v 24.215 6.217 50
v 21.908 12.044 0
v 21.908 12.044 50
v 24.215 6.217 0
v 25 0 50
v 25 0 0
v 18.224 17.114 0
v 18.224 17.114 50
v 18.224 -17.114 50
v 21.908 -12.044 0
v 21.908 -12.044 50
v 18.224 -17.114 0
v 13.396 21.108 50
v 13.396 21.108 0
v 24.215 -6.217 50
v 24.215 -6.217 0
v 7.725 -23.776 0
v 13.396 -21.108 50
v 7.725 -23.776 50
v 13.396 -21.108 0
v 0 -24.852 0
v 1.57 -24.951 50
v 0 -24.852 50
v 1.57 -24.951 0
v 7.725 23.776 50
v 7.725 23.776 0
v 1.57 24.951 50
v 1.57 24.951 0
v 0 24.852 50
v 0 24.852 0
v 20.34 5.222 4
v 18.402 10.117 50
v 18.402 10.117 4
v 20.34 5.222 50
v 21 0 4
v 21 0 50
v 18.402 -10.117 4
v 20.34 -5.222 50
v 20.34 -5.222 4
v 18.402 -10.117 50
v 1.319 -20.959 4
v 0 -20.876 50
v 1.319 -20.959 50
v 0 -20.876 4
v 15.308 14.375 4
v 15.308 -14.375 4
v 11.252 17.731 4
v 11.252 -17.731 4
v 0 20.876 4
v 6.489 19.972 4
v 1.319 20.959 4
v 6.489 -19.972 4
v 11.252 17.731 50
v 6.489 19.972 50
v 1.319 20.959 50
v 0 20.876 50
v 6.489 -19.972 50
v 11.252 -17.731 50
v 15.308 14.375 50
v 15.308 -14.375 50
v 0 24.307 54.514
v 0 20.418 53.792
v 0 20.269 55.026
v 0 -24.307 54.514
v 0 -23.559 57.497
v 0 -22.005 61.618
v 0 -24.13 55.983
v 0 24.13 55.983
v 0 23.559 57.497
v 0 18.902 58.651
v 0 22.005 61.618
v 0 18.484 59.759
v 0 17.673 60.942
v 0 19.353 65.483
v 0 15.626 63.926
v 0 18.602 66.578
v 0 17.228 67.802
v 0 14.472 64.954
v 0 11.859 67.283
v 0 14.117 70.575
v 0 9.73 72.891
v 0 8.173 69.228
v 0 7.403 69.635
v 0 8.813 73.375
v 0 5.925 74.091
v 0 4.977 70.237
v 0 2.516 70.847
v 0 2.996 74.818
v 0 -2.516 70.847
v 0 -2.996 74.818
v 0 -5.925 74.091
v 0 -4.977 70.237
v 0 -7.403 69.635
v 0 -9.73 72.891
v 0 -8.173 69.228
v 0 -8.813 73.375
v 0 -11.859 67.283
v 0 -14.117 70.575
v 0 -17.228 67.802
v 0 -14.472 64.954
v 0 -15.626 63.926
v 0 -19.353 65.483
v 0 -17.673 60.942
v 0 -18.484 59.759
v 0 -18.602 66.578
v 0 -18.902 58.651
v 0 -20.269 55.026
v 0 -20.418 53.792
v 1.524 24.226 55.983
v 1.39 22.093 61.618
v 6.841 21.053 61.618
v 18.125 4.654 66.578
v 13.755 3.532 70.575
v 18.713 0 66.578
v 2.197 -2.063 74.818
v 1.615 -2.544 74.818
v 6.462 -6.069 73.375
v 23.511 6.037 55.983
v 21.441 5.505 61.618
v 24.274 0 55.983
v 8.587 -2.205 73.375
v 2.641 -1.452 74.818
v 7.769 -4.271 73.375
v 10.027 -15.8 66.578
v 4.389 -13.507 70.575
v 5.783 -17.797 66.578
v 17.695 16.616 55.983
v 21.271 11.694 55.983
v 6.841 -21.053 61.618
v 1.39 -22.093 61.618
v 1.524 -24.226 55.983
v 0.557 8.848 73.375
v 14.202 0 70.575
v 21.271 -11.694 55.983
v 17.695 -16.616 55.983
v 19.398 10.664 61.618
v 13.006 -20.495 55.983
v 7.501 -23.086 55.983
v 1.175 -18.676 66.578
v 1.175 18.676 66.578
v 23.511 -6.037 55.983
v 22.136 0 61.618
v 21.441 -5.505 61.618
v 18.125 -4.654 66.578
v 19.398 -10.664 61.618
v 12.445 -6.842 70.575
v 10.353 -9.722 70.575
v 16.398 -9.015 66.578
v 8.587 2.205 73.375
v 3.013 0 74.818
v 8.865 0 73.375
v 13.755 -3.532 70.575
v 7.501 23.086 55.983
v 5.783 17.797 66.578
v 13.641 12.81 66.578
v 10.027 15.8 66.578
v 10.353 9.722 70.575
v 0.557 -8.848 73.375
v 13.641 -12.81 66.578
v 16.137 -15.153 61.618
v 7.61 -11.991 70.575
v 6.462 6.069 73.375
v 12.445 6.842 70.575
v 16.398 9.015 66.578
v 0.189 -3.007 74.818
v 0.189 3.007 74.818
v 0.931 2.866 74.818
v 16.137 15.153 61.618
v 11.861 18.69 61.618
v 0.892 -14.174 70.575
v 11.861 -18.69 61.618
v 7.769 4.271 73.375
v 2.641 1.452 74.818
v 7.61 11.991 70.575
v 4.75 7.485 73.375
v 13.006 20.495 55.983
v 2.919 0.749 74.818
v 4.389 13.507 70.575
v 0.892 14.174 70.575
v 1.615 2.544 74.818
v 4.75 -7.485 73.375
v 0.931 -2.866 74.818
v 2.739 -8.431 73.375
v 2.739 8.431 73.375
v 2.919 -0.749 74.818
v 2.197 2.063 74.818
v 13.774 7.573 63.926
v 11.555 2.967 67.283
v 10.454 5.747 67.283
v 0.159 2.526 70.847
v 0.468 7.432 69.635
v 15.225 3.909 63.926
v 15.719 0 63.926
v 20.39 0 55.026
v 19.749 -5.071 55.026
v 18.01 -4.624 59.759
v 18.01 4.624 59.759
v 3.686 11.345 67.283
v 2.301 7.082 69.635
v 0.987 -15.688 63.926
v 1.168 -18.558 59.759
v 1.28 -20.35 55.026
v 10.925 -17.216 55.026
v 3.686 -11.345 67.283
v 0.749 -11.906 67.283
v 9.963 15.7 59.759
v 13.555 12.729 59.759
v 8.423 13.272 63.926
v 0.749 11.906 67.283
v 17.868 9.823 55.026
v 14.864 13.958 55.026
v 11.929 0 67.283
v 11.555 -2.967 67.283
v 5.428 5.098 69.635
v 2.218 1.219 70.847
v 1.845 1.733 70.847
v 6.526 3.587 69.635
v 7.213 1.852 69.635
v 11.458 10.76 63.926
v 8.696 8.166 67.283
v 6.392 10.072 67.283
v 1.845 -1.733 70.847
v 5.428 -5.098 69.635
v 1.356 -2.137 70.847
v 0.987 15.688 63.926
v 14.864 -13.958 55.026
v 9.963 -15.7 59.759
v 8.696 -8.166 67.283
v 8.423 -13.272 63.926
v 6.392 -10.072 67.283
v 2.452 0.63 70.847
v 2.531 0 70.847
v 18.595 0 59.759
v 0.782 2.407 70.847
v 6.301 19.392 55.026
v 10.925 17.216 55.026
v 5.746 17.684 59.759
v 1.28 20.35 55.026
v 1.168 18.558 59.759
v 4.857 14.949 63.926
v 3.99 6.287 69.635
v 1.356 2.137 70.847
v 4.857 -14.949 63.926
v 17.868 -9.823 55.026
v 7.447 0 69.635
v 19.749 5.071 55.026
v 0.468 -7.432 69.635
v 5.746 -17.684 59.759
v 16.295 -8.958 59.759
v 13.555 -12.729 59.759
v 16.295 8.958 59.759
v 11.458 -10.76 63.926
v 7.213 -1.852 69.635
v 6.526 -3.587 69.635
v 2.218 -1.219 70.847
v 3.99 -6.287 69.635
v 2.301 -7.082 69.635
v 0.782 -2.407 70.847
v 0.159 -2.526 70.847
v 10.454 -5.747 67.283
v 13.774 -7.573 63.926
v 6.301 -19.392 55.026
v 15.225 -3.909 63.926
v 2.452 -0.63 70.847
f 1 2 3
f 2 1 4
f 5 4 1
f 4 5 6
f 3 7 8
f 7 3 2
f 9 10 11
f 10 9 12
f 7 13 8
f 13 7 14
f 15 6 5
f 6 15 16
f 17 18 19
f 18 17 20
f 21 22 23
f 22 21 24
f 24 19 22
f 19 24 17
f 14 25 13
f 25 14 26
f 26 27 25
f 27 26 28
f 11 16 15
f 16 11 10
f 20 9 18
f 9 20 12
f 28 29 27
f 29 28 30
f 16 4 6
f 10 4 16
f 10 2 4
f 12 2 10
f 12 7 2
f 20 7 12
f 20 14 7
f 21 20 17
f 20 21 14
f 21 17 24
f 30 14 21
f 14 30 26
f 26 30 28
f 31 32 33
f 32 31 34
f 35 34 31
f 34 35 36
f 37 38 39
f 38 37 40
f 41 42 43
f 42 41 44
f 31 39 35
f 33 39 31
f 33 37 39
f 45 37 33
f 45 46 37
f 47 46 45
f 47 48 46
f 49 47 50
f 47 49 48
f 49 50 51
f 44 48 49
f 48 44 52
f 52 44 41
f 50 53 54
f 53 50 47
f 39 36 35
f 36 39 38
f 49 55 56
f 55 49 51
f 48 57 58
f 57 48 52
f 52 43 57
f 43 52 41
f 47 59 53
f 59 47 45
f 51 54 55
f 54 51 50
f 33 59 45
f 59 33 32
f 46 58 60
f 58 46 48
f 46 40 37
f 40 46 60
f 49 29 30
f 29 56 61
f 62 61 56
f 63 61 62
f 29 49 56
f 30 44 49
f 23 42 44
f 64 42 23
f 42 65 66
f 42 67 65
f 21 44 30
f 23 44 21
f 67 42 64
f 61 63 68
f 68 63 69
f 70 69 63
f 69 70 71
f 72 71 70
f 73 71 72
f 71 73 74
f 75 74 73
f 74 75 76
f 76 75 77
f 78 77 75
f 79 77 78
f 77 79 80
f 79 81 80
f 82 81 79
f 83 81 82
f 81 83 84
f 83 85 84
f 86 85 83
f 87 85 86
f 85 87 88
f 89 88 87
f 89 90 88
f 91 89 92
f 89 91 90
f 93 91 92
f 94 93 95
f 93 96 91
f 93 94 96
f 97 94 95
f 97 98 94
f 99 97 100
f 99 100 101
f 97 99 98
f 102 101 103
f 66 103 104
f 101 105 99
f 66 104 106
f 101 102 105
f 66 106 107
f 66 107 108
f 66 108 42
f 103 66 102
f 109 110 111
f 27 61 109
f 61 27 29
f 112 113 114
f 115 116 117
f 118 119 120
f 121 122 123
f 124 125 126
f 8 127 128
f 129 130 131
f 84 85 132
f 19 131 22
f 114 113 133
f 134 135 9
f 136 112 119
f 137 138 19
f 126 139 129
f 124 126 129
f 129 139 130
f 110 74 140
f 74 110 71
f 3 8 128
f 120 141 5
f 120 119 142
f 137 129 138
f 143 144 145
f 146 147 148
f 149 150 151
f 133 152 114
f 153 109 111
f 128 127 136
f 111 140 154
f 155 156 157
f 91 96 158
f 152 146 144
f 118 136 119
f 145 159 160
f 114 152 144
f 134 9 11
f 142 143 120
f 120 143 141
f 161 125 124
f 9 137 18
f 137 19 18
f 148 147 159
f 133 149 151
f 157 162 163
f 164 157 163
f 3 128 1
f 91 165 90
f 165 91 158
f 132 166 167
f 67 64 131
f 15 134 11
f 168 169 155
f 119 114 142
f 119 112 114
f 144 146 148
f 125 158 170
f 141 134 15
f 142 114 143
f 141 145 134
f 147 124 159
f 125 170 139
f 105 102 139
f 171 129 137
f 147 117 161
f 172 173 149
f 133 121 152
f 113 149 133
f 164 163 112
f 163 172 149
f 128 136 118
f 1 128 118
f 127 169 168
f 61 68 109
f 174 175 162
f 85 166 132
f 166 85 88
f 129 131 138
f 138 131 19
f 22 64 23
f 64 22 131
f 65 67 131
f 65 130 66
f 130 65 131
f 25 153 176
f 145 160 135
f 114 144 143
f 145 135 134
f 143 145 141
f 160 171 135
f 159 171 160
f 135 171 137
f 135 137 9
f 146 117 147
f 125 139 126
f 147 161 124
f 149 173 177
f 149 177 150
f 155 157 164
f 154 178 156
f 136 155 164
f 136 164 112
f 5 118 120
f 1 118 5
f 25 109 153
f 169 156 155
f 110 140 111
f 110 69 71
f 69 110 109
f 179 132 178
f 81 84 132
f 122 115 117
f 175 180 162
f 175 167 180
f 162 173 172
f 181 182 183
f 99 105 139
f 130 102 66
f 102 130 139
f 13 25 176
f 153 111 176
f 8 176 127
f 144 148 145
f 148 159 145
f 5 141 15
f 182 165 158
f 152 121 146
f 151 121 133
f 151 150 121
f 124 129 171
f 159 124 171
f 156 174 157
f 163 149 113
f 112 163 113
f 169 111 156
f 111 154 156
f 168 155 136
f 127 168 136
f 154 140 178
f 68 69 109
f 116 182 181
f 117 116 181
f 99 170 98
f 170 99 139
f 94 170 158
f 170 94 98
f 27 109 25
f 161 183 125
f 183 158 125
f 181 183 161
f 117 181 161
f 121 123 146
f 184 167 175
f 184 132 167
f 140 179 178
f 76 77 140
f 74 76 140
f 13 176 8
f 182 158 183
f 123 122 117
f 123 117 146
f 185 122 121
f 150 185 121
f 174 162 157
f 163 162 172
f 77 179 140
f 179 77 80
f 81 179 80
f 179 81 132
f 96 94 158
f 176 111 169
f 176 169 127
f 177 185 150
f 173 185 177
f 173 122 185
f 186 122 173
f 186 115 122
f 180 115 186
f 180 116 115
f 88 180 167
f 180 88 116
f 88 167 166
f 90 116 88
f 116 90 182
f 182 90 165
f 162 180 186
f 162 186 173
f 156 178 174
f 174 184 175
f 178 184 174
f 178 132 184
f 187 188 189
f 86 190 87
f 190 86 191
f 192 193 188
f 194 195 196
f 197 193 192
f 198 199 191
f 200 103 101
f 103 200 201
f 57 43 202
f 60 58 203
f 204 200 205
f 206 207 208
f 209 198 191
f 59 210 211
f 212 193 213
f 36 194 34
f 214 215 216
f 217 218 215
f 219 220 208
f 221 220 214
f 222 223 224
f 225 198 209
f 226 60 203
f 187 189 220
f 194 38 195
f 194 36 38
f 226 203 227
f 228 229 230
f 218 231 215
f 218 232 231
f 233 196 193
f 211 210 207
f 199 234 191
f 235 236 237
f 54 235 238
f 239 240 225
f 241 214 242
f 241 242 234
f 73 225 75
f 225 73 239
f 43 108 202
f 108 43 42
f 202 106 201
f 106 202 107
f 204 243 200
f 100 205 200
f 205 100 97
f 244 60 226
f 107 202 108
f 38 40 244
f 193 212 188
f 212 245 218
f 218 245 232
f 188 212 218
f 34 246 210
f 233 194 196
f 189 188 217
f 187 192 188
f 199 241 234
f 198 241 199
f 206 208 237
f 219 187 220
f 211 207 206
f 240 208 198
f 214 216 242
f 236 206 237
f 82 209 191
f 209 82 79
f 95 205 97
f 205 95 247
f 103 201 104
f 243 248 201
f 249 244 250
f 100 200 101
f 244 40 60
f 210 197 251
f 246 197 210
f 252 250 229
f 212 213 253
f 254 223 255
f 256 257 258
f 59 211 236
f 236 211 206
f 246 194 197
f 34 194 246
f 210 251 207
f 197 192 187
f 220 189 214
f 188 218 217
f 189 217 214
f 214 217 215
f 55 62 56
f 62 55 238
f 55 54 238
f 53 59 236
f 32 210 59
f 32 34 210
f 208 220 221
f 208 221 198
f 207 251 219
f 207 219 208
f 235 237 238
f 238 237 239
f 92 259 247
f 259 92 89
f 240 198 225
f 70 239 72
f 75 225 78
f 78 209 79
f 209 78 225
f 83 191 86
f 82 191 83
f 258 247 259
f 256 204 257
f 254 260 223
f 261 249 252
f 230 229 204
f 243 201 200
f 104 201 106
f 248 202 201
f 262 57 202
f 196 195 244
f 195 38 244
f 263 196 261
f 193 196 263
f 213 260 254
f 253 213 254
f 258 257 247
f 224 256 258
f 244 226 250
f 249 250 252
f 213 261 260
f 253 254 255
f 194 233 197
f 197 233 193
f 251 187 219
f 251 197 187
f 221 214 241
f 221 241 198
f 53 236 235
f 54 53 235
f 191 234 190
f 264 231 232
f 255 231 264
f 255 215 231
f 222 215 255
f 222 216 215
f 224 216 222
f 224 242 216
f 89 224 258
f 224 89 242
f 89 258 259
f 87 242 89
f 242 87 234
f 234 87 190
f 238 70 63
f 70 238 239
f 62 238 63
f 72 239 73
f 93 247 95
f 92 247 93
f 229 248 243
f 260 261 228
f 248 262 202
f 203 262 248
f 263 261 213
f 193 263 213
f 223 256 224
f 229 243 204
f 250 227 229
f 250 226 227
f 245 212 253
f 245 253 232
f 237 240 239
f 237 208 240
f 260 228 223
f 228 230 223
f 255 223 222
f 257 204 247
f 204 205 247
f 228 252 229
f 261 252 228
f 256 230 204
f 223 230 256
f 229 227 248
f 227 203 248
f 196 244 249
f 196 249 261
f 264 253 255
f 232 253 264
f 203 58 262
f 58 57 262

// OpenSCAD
$fn=25;

*difference() { 
    linear_extrude(50) minkowski() { 
        square(48, center=true); 
        circle(1);
    }
    
    translate([0,0,2]) linear_extrude(50) minkowski() { 
        square(40, center=true); 
        circle(1);
    }
    translate([0,-25,-1]) cube([50,50,60]);
}

difference() { 
    cylinder(50, 25, 25);
    translate([0,0,4]) cylinder(51, 21, 21); 
    translate([-25,-25,0]) cube([25,50,51]);   
}

translate([0,0,50]) difference() { 
    sphere(25);
    sphere(21);
    translate([-25,0,0]) cube(50,50,50, center=true);
    translate([0,0,-25]) cube(50,50,50, center=true);
}
